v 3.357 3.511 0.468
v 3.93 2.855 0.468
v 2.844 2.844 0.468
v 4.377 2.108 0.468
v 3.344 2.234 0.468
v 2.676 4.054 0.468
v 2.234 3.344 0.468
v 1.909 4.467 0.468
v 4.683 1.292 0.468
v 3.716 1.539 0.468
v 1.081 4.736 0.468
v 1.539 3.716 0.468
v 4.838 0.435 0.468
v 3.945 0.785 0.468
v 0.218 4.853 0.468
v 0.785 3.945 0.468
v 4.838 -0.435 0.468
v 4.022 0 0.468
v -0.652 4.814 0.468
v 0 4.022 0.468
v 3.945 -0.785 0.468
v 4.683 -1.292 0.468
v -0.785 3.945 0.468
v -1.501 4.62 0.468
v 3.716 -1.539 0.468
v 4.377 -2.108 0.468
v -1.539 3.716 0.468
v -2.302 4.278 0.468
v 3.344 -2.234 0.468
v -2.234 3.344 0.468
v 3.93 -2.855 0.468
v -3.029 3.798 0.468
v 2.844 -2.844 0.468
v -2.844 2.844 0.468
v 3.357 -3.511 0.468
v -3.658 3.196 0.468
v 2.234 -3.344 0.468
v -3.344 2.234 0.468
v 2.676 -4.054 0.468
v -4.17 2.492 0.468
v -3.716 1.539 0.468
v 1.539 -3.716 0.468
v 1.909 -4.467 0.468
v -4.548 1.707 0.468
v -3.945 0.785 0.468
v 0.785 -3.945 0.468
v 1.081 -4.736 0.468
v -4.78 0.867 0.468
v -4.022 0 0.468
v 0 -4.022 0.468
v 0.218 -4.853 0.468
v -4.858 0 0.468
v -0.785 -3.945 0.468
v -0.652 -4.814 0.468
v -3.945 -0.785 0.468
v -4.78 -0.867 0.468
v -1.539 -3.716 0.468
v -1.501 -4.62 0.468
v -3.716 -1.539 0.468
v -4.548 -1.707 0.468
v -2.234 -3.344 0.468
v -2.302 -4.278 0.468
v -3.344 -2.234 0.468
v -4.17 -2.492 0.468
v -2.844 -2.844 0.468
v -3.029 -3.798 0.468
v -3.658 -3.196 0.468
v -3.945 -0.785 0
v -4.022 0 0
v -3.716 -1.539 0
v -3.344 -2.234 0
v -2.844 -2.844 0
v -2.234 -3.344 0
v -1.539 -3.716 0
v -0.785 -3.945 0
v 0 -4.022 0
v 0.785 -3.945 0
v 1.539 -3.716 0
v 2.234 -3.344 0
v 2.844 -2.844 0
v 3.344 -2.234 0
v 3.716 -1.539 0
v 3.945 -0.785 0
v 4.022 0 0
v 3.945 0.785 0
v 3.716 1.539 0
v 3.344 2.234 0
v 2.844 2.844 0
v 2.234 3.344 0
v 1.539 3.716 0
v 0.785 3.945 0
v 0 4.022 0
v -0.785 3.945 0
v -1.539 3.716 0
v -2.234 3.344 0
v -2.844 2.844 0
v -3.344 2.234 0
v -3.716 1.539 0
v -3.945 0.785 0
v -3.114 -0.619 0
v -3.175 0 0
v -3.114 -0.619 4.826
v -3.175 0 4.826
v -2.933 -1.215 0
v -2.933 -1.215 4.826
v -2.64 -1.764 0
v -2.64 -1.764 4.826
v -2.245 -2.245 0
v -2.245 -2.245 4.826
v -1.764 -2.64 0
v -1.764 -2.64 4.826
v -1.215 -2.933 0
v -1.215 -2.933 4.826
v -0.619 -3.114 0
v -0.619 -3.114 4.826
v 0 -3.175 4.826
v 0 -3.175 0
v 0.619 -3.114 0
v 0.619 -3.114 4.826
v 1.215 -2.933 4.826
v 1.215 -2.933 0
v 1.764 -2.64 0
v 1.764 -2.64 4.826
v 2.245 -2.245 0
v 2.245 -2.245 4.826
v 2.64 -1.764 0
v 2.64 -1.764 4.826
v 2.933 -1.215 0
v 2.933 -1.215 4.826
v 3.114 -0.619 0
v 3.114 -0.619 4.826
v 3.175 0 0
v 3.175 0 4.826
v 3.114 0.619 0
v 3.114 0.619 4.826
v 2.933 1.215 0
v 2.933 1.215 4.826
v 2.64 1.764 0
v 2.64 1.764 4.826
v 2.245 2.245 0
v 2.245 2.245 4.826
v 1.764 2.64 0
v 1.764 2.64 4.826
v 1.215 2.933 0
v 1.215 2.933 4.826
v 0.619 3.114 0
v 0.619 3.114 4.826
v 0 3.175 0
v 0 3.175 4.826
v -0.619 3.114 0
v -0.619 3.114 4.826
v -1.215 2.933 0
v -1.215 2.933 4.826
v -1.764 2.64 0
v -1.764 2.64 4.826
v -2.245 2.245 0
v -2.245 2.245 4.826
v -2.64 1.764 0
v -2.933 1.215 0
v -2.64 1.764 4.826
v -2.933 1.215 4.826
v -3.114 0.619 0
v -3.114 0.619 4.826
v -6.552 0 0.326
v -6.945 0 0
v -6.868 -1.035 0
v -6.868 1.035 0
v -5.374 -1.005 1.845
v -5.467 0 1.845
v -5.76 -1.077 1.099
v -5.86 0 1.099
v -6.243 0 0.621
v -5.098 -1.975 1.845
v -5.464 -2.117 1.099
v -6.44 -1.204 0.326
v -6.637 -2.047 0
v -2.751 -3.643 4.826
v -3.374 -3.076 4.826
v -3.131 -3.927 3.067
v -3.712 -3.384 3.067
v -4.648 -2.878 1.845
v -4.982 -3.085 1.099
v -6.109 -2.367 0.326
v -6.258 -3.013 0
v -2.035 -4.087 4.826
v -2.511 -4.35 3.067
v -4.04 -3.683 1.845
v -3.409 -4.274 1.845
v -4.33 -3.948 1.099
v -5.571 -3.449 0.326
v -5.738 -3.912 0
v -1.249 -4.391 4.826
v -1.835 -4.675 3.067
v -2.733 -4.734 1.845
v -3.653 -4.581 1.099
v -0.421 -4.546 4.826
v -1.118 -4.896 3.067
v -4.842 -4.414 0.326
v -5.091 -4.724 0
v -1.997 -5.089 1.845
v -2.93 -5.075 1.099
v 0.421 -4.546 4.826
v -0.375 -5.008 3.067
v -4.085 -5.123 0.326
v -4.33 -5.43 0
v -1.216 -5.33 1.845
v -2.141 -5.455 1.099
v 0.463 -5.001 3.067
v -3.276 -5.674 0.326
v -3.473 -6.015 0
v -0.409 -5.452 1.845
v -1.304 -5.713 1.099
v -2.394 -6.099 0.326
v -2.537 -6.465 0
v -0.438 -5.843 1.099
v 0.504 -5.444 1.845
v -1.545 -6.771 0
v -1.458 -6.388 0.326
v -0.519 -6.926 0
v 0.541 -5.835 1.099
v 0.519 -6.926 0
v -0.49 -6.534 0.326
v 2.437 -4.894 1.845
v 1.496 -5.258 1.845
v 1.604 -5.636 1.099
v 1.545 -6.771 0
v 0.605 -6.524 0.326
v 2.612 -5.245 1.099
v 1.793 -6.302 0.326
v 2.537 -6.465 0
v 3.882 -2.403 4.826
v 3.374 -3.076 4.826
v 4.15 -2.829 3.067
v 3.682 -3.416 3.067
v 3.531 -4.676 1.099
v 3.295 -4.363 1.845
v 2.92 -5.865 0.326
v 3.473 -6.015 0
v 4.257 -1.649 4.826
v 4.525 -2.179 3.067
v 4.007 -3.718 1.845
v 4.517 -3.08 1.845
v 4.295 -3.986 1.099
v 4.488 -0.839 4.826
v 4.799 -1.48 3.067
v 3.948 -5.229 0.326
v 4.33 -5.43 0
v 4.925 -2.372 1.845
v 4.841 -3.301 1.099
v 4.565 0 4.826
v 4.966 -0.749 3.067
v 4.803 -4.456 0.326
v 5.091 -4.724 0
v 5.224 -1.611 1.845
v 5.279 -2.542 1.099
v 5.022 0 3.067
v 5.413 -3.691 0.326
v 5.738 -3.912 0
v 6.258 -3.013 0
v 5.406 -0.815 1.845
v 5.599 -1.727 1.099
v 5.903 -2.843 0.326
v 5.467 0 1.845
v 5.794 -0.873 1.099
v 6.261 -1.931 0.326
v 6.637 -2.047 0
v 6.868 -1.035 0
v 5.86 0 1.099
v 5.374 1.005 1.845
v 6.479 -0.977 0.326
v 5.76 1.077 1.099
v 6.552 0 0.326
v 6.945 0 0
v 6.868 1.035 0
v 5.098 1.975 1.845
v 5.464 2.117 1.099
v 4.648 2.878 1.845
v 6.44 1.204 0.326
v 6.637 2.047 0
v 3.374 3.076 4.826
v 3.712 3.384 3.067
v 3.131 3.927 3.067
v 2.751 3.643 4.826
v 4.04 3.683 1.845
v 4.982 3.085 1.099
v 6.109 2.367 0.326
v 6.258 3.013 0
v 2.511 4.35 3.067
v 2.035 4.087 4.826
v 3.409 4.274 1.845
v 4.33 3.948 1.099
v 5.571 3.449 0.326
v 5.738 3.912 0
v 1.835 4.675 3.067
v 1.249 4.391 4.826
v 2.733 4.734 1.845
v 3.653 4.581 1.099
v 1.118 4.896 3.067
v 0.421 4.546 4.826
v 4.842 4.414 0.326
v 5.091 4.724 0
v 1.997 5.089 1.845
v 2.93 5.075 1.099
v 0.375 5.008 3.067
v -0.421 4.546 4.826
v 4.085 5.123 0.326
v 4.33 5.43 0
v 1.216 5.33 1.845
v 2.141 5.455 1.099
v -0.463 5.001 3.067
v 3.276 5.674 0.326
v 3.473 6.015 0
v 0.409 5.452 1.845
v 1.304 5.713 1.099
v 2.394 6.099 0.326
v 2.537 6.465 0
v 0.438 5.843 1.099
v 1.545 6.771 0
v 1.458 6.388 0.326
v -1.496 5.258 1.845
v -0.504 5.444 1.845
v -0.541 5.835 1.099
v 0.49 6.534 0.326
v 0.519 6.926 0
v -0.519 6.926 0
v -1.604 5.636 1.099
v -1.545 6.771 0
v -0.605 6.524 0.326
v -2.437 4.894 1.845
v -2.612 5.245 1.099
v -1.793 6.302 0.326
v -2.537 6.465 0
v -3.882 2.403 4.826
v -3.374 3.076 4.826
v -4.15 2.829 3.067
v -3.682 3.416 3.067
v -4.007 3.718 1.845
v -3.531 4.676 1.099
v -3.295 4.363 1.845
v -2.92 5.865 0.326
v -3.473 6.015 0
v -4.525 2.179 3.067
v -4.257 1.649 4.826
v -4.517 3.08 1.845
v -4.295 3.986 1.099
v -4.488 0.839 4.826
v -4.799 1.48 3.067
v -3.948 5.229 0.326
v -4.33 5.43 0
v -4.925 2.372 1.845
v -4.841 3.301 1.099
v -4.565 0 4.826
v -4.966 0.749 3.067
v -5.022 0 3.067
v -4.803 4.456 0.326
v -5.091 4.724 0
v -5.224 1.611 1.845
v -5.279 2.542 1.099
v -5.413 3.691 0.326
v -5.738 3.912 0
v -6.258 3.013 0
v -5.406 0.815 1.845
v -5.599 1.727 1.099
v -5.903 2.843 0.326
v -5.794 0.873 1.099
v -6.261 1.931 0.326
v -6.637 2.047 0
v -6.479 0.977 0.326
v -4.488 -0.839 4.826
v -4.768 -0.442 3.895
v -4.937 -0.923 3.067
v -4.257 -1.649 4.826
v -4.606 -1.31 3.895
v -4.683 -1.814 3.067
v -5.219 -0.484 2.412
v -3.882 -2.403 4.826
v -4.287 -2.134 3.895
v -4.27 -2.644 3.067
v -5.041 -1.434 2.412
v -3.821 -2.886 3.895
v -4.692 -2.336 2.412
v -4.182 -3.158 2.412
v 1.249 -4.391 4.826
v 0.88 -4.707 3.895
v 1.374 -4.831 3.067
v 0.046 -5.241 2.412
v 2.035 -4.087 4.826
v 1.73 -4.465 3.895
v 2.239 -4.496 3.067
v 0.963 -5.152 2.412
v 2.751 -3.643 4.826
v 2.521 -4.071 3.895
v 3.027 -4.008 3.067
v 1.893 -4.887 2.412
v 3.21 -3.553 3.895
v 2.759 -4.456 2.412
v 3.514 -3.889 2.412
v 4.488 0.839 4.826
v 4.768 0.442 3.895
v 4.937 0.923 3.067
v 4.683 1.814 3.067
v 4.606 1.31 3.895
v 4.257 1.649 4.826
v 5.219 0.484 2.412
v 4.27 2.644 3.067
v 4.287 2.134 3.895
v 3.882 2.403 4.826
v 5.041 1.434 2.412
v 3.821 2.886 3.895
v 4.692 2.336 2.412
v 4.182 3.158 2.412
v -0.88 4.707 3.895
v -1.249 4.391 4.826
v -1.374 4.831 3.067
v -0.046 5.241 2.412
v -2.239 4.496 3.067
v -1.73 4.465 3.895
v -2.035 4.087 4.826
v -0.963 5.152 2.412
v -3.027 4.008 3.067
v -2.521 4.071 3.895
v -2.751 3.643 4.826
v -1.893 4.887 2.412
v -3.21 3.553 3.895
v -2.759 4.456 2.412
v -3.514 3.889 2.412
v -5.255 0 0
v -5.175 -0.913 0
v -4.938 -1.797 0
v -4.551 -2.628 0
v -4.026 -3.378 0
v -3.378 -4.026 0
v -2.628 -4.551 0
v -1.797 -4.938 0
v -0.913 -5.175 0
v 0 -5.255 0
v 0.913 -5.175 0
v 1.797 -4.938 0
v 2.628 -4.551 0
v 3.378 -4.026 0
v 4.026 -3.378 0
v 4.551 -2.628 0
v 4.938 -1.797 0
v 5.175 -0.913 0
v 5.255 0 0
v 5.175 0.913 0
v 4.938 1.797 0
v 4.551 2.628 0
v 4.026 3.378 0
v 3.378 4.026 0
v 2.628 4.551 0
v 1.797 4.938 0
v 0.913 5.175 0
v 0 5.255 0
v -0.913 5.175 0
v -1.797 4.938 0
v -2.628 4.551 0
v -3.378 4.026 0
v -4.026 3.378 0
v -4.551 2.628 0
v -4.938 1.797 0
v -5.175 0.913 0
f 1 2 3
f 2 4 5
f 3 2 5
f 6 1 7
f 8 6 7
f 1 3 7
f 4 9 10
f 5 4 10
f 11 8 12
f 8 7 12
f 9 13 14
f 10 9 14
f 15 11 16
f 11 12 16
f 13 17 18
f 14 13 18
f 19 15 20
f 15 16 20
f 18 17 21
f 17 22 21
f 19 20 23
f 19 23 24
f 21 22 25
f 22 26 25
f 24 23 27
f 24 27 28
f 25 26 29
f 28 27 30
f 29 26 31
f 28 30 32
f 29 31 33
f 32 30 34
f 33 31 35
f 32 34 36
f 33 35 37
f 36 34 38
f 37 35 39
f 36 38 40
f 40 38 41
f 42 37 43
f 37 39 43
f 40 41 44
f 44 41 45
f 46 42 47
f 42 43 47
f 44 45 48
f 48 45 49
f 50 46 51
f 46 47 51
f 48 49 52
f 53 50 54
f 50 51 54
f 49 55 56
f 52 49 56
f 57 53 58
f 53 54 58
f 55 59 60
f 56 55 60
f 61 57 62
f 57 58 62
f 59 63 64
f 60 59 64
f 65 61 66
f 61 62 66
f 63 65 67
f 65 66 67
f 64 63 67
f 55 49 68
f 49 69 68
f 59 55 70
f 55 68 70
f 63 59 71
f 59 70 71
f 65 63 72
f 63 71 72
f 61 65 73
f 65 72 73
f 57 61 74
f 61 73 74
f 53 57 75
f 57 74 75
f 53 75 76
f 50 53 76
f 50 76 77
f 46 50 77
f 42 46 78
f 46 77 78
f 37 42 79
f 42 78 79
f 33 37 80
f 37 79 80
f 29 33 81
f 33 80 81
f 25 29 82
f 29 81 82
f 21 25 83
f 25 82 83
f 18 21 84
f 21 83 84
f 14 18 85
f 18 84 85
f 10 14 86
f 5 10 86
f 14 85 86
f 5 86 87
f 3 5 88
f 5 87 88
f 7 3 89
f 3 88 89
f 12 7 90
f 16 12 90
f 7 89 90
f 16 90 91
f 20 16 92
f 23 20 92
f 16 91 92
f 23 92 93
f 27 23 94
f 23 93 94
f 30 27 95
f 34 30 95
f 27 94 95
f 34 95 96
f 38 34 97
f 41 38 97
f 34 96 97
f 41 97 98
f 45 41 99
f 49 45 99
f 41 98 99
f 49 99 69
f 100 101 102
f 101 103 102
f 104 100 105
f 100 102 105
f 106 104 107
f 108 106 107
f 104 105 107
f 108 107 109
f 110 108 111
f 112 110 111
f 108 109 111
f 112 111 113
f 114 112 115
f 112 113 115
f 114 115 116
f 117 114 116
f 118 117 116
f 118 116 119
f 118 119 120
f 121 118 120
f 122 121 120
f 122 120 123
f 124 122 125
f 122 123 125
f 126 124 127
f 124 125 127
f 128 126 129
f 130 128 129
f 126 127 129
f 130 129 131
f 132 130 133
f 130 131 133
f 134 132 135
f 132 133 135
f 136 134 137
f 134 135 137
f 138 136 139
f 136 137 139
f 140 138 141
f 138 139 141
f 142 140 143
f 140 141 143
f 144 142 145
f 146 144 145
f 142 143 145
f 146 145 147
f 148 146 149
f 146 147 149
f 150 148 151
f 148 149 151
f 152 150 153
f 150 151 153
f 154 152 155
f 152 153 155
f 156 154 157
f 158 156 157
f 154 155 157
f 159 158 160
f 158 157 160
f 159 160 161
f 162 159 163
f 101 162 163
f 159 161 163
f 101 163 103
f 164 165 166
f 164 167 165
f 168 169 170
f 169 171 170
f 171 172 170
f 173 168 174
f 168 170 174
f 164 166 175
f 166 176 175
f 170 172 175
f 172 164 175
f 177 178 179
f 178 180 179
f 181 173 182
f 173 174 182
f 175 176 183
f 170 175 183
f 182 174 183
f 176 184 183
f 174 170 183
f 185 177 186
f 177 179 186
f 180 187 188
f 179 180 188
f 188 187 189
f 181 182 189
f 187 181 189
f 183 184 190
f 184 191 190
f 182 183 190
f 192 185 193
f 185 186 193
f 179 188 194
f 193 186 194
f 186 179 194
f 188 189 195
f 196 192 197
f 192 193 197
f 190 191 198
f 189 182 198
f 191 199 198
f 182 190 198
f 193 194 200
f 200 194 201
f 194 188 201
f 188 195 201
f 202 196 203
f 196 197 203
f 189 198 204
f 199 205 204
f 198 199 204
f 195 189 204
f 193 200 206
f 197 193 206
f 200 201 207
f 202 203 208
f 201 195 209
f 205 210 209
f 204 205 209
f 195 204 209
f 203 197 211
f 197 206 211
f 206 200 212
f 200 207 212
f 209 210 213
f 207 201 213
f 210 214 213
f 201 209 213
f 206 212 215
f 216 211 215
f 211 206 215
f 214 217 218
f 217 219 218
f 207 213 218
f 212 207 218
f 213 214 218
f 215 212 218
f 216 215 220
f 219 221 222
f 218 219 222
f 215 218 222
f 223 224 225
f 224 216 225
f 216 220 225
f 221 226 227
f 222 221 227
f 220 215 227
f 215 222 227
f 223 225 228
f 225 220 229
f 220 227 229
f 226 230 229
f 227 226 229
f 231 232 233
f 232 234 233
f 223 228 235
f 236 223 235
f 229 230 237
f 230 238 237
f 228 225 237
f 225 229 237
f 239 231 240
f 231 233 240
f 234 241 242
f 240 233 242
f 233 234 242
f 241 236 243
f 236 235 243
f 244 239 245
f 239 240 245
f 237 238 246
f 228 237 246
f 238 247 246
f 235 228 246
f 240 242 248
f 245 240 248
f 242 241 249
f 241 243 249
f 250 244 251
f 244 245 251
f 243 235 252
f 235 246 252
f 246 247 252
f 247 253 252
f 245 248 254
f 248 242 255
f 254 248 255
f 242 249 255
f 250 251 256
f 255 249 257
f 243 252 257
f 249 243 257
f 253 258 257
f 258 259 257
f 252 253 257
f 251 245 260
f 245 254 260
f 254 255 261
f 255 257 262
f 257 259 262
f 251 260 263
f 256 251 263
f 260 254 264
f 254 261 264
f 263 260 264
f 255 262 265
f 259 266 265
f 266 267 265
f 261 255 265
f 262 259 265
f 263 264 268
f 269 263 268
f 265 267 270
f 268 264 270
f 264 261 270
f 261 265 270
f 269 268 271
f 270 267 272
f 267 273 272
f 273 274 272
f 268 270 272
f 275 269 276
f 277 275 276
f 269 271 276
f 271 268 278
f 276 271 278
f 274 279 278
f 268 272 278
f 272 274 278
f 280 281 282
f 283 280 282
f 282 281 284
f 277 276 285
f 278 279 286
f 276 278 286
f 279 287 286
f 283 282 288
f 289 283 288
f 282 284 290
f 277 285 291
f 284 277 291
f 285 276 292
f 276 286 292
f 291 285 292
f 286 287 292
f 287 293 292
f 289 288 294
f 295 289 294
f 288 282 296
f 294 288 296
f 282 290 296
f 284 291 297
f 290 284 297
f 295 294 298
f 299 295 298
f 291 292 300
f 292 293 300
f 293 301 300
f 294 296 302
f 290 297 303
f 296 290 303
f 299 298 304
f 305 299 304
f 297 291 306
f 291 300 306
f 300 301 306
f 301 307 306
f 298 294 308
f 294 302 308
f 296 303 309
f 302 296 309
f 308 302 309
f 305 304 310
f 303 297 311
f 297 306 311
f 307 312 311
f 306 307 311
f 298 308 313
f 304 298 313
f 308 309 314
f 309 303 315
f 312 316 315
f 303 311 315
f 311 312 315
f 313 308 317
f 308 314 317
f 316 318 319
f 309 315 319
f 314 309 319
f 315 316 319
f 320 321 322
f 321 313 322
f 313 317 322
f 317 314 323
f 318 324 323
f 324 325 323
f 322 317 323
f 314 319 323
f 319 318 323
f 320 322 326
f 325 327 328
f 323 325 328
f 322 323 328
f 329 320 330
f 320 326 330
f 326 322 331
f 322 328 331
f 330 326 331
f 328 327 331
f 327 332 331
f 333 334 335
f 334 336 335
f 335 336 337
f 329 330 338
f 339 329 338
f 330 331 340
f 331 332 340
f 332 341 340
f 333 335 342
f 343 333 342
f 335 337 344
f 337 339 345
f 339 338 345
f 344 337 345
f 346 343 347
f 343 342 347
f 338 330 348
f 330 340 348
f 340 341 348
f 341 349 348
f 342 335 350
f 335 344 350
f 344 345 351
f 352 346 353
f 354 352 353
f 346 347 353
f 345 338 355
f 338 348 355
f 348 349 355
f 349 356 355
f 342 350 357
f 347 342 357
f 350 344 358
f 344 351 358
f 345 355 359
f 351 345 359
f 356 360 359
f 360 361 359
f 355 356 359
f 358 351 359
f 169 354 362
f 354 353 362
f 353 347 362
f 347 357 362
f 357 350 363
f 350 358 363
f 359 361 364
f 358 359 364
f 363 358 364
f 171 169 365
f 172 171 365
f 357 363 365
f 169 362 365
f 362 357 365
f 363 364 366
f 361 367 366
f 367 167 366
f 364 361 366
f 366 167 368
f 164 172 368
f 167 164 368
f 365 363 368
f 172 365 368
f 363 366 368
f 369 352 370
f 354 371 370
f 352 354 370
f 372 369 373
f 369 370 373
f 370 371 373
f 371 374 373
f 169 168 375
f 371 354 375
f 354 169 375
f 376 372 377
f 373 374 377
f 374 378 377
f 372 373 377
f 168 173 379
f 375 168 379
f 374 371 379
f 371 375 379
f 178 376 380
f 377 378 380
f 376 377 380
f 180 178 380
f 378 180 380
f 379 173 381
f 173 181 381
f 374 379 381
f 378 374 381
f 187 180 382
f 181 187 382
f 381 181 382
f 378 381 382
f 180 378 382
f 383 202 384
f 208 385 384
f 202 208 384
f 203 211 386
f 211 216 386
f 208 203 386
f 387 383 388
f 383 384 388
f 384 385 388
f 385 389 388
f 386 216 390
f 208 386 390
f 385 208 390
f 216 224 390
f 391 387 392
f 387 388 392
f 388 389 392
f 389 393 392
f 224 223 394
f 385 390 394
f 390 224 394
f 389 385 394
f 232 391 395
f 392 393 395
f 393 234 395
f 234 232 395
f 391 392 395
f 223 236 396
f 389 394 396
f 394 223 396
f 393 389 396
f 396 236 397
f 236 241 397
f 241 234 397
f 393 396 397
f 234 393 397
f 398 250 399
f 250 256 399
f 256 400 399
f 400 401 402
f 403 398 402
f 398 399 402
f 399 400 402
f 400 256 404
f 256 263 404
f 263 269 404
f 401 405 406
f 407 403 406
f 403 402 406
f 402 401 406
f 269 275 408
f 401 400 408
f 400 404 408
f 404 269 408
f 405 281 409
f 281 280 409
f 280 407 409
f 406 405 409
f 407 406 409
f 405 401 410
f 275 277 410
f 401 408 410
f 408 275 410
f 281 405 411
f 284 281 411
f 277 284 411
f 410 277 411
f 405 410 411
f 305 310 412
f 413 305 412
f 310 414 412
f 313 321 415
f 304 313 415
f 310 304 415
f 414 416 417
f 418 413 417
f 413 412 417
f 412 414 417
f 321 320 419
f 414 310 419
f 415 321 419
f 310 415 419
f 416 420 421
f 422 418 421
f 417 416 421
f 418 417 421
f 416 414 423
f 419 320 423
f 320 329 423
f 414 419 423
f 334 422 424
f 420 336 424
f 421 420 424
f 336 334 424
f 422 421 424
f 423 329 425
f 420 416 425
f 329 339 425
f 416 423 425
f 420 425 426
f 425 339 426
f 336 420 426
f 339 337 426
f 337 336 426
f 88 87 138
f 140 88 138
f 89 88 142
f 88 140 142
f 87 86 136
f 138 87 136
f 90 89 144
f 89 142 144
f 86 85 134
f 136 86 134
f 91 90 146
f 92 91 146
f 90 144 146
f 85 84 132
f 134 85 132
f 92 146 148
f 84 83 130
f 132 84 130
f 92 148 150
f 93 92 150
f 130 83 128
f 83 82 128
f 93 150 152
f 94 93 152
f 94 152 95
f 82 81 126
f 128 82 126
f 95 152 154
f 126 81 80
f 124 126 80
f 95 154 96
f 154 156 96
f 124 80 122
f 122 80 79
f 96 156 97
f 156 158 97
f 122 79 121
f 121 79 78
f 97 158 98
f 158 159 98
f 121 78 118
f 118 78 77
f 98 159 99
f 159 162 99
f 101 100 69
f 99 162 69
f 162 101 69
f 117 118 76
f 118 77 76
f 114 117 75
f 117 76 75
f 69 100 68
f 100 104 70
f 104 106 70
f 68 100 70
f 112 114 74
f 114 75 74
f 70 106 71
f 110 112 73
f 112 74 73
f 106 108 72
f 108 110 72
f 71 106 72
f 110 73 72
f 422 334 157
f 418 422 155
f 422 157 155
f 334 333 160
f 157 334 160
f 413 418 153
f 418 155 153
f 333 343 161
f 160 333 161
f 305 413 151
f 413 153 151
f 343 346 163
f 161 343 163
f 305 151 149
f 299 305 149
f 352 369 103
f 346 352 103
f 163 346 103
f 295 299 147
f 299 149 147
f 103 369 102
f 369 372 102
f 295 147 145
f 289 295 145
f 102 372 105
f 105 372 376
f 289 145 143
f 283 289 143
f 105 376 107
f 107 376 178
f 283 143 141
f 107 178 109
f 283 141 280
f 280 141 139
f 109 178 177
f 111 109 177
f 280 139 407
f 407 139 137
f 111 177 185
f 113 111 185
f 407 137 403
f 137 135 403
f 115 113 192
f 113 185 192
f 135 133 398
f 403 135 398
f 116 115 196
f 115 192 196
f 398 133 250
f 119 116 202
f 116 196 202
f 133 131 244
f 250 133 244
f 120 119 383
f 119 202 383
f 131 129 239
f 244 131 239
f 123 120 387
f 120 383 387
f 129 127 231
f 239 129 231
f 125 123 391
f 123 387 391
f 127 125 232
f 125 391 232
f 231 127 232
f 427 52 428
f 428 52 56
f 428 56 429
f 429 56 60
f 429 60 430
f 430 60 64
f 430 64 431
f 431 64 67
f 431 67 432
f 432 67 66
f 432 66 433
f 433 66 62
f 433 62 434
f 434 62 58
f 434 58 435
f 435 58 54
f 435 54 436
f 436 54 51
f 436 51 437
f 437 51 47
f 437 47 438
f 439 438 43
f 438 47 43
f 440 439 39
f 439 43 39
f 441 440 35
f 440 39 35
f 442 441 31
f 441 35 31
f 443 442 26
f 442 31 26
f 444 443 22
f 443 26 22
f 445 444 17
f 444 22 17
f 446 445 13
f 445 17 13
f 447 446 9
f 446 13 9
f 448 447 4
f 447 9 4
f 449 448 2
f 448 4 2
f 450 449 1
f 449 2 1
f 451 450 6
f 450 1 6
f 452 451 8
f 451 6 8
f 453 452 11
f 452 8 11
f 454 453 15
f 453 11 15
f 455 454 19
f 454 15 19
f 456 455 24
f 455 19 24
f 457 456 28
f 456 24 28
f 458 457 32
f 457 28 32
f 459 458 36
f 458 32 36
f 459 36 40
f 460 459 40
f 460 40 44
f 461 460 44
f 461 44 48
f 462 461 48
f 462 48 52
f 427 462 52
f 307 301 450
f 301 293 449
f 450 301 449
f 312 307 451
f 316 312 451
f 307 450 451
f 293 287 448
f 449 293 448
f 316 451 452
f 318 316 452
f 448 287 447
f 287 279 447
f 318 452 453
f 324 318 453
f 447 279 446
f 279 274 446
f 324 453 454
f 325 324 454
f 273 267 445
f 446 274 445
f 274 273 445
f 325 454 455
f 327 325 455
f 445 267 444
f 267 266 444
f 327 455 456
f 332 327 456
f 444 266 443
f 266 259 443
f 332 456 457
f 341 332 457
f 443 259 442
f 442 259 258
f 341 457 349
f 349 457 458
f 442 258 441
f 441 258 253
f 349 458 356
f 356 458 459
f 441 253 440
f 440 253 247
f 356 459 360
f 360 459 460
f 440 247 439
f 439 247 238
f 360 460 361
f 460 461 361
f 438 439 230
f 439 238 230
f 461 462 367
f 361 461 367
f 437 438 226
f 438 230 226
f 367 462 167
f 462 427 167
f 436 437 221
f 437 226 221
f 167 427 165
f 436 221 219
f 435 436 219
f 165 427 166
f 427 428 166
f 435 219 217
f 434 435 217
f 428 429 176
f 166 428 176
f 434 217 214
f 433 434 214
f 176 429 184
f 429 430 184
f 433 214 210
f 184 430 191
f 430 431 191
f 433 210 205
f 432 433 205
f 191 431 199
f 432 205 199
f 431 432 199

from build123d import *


with BuildPart() as f1:
    # F0 (on Front) → F1 (revolve)
    with BuildSketch(Plane.XZ):
        with BuildLine():
            Line((-3.175, 0), (-3.175, 4.826))
            Line((-3.175, 4.826), (-4.5654736459, 4.826))
            add(Edge.make_bspline(
                [(-4.5654736459, 4.826), (-4.8888199963, 3.3683741931), (-5.5216582711, 1.3934291844), (-6.2301136902, 0.564768836), (-6.9453125, 0)],
                knots=[0, 0, 0, 0, 0.5708708677, 1, 1, 1, 1], degree=3))
            Line((-6.9453125, 0), (-5.2552358247, 0))
            Line((-5.2552358247, 0), (-4.8580123112, 0.467726466))
            Line((-4.8580123112, 0.467726466), (-4.0218508802, 0.467726466))
            Line((-4.0218508802, 0.467726466), (-4.0218508802, 0))
            Line((-4.0218508802, 0), (-3.175, 0))
        make_face()
    revolve(axis=Axis((0, 0, 4.2204221714), (0, 0, 1)))


solid = f1.part
